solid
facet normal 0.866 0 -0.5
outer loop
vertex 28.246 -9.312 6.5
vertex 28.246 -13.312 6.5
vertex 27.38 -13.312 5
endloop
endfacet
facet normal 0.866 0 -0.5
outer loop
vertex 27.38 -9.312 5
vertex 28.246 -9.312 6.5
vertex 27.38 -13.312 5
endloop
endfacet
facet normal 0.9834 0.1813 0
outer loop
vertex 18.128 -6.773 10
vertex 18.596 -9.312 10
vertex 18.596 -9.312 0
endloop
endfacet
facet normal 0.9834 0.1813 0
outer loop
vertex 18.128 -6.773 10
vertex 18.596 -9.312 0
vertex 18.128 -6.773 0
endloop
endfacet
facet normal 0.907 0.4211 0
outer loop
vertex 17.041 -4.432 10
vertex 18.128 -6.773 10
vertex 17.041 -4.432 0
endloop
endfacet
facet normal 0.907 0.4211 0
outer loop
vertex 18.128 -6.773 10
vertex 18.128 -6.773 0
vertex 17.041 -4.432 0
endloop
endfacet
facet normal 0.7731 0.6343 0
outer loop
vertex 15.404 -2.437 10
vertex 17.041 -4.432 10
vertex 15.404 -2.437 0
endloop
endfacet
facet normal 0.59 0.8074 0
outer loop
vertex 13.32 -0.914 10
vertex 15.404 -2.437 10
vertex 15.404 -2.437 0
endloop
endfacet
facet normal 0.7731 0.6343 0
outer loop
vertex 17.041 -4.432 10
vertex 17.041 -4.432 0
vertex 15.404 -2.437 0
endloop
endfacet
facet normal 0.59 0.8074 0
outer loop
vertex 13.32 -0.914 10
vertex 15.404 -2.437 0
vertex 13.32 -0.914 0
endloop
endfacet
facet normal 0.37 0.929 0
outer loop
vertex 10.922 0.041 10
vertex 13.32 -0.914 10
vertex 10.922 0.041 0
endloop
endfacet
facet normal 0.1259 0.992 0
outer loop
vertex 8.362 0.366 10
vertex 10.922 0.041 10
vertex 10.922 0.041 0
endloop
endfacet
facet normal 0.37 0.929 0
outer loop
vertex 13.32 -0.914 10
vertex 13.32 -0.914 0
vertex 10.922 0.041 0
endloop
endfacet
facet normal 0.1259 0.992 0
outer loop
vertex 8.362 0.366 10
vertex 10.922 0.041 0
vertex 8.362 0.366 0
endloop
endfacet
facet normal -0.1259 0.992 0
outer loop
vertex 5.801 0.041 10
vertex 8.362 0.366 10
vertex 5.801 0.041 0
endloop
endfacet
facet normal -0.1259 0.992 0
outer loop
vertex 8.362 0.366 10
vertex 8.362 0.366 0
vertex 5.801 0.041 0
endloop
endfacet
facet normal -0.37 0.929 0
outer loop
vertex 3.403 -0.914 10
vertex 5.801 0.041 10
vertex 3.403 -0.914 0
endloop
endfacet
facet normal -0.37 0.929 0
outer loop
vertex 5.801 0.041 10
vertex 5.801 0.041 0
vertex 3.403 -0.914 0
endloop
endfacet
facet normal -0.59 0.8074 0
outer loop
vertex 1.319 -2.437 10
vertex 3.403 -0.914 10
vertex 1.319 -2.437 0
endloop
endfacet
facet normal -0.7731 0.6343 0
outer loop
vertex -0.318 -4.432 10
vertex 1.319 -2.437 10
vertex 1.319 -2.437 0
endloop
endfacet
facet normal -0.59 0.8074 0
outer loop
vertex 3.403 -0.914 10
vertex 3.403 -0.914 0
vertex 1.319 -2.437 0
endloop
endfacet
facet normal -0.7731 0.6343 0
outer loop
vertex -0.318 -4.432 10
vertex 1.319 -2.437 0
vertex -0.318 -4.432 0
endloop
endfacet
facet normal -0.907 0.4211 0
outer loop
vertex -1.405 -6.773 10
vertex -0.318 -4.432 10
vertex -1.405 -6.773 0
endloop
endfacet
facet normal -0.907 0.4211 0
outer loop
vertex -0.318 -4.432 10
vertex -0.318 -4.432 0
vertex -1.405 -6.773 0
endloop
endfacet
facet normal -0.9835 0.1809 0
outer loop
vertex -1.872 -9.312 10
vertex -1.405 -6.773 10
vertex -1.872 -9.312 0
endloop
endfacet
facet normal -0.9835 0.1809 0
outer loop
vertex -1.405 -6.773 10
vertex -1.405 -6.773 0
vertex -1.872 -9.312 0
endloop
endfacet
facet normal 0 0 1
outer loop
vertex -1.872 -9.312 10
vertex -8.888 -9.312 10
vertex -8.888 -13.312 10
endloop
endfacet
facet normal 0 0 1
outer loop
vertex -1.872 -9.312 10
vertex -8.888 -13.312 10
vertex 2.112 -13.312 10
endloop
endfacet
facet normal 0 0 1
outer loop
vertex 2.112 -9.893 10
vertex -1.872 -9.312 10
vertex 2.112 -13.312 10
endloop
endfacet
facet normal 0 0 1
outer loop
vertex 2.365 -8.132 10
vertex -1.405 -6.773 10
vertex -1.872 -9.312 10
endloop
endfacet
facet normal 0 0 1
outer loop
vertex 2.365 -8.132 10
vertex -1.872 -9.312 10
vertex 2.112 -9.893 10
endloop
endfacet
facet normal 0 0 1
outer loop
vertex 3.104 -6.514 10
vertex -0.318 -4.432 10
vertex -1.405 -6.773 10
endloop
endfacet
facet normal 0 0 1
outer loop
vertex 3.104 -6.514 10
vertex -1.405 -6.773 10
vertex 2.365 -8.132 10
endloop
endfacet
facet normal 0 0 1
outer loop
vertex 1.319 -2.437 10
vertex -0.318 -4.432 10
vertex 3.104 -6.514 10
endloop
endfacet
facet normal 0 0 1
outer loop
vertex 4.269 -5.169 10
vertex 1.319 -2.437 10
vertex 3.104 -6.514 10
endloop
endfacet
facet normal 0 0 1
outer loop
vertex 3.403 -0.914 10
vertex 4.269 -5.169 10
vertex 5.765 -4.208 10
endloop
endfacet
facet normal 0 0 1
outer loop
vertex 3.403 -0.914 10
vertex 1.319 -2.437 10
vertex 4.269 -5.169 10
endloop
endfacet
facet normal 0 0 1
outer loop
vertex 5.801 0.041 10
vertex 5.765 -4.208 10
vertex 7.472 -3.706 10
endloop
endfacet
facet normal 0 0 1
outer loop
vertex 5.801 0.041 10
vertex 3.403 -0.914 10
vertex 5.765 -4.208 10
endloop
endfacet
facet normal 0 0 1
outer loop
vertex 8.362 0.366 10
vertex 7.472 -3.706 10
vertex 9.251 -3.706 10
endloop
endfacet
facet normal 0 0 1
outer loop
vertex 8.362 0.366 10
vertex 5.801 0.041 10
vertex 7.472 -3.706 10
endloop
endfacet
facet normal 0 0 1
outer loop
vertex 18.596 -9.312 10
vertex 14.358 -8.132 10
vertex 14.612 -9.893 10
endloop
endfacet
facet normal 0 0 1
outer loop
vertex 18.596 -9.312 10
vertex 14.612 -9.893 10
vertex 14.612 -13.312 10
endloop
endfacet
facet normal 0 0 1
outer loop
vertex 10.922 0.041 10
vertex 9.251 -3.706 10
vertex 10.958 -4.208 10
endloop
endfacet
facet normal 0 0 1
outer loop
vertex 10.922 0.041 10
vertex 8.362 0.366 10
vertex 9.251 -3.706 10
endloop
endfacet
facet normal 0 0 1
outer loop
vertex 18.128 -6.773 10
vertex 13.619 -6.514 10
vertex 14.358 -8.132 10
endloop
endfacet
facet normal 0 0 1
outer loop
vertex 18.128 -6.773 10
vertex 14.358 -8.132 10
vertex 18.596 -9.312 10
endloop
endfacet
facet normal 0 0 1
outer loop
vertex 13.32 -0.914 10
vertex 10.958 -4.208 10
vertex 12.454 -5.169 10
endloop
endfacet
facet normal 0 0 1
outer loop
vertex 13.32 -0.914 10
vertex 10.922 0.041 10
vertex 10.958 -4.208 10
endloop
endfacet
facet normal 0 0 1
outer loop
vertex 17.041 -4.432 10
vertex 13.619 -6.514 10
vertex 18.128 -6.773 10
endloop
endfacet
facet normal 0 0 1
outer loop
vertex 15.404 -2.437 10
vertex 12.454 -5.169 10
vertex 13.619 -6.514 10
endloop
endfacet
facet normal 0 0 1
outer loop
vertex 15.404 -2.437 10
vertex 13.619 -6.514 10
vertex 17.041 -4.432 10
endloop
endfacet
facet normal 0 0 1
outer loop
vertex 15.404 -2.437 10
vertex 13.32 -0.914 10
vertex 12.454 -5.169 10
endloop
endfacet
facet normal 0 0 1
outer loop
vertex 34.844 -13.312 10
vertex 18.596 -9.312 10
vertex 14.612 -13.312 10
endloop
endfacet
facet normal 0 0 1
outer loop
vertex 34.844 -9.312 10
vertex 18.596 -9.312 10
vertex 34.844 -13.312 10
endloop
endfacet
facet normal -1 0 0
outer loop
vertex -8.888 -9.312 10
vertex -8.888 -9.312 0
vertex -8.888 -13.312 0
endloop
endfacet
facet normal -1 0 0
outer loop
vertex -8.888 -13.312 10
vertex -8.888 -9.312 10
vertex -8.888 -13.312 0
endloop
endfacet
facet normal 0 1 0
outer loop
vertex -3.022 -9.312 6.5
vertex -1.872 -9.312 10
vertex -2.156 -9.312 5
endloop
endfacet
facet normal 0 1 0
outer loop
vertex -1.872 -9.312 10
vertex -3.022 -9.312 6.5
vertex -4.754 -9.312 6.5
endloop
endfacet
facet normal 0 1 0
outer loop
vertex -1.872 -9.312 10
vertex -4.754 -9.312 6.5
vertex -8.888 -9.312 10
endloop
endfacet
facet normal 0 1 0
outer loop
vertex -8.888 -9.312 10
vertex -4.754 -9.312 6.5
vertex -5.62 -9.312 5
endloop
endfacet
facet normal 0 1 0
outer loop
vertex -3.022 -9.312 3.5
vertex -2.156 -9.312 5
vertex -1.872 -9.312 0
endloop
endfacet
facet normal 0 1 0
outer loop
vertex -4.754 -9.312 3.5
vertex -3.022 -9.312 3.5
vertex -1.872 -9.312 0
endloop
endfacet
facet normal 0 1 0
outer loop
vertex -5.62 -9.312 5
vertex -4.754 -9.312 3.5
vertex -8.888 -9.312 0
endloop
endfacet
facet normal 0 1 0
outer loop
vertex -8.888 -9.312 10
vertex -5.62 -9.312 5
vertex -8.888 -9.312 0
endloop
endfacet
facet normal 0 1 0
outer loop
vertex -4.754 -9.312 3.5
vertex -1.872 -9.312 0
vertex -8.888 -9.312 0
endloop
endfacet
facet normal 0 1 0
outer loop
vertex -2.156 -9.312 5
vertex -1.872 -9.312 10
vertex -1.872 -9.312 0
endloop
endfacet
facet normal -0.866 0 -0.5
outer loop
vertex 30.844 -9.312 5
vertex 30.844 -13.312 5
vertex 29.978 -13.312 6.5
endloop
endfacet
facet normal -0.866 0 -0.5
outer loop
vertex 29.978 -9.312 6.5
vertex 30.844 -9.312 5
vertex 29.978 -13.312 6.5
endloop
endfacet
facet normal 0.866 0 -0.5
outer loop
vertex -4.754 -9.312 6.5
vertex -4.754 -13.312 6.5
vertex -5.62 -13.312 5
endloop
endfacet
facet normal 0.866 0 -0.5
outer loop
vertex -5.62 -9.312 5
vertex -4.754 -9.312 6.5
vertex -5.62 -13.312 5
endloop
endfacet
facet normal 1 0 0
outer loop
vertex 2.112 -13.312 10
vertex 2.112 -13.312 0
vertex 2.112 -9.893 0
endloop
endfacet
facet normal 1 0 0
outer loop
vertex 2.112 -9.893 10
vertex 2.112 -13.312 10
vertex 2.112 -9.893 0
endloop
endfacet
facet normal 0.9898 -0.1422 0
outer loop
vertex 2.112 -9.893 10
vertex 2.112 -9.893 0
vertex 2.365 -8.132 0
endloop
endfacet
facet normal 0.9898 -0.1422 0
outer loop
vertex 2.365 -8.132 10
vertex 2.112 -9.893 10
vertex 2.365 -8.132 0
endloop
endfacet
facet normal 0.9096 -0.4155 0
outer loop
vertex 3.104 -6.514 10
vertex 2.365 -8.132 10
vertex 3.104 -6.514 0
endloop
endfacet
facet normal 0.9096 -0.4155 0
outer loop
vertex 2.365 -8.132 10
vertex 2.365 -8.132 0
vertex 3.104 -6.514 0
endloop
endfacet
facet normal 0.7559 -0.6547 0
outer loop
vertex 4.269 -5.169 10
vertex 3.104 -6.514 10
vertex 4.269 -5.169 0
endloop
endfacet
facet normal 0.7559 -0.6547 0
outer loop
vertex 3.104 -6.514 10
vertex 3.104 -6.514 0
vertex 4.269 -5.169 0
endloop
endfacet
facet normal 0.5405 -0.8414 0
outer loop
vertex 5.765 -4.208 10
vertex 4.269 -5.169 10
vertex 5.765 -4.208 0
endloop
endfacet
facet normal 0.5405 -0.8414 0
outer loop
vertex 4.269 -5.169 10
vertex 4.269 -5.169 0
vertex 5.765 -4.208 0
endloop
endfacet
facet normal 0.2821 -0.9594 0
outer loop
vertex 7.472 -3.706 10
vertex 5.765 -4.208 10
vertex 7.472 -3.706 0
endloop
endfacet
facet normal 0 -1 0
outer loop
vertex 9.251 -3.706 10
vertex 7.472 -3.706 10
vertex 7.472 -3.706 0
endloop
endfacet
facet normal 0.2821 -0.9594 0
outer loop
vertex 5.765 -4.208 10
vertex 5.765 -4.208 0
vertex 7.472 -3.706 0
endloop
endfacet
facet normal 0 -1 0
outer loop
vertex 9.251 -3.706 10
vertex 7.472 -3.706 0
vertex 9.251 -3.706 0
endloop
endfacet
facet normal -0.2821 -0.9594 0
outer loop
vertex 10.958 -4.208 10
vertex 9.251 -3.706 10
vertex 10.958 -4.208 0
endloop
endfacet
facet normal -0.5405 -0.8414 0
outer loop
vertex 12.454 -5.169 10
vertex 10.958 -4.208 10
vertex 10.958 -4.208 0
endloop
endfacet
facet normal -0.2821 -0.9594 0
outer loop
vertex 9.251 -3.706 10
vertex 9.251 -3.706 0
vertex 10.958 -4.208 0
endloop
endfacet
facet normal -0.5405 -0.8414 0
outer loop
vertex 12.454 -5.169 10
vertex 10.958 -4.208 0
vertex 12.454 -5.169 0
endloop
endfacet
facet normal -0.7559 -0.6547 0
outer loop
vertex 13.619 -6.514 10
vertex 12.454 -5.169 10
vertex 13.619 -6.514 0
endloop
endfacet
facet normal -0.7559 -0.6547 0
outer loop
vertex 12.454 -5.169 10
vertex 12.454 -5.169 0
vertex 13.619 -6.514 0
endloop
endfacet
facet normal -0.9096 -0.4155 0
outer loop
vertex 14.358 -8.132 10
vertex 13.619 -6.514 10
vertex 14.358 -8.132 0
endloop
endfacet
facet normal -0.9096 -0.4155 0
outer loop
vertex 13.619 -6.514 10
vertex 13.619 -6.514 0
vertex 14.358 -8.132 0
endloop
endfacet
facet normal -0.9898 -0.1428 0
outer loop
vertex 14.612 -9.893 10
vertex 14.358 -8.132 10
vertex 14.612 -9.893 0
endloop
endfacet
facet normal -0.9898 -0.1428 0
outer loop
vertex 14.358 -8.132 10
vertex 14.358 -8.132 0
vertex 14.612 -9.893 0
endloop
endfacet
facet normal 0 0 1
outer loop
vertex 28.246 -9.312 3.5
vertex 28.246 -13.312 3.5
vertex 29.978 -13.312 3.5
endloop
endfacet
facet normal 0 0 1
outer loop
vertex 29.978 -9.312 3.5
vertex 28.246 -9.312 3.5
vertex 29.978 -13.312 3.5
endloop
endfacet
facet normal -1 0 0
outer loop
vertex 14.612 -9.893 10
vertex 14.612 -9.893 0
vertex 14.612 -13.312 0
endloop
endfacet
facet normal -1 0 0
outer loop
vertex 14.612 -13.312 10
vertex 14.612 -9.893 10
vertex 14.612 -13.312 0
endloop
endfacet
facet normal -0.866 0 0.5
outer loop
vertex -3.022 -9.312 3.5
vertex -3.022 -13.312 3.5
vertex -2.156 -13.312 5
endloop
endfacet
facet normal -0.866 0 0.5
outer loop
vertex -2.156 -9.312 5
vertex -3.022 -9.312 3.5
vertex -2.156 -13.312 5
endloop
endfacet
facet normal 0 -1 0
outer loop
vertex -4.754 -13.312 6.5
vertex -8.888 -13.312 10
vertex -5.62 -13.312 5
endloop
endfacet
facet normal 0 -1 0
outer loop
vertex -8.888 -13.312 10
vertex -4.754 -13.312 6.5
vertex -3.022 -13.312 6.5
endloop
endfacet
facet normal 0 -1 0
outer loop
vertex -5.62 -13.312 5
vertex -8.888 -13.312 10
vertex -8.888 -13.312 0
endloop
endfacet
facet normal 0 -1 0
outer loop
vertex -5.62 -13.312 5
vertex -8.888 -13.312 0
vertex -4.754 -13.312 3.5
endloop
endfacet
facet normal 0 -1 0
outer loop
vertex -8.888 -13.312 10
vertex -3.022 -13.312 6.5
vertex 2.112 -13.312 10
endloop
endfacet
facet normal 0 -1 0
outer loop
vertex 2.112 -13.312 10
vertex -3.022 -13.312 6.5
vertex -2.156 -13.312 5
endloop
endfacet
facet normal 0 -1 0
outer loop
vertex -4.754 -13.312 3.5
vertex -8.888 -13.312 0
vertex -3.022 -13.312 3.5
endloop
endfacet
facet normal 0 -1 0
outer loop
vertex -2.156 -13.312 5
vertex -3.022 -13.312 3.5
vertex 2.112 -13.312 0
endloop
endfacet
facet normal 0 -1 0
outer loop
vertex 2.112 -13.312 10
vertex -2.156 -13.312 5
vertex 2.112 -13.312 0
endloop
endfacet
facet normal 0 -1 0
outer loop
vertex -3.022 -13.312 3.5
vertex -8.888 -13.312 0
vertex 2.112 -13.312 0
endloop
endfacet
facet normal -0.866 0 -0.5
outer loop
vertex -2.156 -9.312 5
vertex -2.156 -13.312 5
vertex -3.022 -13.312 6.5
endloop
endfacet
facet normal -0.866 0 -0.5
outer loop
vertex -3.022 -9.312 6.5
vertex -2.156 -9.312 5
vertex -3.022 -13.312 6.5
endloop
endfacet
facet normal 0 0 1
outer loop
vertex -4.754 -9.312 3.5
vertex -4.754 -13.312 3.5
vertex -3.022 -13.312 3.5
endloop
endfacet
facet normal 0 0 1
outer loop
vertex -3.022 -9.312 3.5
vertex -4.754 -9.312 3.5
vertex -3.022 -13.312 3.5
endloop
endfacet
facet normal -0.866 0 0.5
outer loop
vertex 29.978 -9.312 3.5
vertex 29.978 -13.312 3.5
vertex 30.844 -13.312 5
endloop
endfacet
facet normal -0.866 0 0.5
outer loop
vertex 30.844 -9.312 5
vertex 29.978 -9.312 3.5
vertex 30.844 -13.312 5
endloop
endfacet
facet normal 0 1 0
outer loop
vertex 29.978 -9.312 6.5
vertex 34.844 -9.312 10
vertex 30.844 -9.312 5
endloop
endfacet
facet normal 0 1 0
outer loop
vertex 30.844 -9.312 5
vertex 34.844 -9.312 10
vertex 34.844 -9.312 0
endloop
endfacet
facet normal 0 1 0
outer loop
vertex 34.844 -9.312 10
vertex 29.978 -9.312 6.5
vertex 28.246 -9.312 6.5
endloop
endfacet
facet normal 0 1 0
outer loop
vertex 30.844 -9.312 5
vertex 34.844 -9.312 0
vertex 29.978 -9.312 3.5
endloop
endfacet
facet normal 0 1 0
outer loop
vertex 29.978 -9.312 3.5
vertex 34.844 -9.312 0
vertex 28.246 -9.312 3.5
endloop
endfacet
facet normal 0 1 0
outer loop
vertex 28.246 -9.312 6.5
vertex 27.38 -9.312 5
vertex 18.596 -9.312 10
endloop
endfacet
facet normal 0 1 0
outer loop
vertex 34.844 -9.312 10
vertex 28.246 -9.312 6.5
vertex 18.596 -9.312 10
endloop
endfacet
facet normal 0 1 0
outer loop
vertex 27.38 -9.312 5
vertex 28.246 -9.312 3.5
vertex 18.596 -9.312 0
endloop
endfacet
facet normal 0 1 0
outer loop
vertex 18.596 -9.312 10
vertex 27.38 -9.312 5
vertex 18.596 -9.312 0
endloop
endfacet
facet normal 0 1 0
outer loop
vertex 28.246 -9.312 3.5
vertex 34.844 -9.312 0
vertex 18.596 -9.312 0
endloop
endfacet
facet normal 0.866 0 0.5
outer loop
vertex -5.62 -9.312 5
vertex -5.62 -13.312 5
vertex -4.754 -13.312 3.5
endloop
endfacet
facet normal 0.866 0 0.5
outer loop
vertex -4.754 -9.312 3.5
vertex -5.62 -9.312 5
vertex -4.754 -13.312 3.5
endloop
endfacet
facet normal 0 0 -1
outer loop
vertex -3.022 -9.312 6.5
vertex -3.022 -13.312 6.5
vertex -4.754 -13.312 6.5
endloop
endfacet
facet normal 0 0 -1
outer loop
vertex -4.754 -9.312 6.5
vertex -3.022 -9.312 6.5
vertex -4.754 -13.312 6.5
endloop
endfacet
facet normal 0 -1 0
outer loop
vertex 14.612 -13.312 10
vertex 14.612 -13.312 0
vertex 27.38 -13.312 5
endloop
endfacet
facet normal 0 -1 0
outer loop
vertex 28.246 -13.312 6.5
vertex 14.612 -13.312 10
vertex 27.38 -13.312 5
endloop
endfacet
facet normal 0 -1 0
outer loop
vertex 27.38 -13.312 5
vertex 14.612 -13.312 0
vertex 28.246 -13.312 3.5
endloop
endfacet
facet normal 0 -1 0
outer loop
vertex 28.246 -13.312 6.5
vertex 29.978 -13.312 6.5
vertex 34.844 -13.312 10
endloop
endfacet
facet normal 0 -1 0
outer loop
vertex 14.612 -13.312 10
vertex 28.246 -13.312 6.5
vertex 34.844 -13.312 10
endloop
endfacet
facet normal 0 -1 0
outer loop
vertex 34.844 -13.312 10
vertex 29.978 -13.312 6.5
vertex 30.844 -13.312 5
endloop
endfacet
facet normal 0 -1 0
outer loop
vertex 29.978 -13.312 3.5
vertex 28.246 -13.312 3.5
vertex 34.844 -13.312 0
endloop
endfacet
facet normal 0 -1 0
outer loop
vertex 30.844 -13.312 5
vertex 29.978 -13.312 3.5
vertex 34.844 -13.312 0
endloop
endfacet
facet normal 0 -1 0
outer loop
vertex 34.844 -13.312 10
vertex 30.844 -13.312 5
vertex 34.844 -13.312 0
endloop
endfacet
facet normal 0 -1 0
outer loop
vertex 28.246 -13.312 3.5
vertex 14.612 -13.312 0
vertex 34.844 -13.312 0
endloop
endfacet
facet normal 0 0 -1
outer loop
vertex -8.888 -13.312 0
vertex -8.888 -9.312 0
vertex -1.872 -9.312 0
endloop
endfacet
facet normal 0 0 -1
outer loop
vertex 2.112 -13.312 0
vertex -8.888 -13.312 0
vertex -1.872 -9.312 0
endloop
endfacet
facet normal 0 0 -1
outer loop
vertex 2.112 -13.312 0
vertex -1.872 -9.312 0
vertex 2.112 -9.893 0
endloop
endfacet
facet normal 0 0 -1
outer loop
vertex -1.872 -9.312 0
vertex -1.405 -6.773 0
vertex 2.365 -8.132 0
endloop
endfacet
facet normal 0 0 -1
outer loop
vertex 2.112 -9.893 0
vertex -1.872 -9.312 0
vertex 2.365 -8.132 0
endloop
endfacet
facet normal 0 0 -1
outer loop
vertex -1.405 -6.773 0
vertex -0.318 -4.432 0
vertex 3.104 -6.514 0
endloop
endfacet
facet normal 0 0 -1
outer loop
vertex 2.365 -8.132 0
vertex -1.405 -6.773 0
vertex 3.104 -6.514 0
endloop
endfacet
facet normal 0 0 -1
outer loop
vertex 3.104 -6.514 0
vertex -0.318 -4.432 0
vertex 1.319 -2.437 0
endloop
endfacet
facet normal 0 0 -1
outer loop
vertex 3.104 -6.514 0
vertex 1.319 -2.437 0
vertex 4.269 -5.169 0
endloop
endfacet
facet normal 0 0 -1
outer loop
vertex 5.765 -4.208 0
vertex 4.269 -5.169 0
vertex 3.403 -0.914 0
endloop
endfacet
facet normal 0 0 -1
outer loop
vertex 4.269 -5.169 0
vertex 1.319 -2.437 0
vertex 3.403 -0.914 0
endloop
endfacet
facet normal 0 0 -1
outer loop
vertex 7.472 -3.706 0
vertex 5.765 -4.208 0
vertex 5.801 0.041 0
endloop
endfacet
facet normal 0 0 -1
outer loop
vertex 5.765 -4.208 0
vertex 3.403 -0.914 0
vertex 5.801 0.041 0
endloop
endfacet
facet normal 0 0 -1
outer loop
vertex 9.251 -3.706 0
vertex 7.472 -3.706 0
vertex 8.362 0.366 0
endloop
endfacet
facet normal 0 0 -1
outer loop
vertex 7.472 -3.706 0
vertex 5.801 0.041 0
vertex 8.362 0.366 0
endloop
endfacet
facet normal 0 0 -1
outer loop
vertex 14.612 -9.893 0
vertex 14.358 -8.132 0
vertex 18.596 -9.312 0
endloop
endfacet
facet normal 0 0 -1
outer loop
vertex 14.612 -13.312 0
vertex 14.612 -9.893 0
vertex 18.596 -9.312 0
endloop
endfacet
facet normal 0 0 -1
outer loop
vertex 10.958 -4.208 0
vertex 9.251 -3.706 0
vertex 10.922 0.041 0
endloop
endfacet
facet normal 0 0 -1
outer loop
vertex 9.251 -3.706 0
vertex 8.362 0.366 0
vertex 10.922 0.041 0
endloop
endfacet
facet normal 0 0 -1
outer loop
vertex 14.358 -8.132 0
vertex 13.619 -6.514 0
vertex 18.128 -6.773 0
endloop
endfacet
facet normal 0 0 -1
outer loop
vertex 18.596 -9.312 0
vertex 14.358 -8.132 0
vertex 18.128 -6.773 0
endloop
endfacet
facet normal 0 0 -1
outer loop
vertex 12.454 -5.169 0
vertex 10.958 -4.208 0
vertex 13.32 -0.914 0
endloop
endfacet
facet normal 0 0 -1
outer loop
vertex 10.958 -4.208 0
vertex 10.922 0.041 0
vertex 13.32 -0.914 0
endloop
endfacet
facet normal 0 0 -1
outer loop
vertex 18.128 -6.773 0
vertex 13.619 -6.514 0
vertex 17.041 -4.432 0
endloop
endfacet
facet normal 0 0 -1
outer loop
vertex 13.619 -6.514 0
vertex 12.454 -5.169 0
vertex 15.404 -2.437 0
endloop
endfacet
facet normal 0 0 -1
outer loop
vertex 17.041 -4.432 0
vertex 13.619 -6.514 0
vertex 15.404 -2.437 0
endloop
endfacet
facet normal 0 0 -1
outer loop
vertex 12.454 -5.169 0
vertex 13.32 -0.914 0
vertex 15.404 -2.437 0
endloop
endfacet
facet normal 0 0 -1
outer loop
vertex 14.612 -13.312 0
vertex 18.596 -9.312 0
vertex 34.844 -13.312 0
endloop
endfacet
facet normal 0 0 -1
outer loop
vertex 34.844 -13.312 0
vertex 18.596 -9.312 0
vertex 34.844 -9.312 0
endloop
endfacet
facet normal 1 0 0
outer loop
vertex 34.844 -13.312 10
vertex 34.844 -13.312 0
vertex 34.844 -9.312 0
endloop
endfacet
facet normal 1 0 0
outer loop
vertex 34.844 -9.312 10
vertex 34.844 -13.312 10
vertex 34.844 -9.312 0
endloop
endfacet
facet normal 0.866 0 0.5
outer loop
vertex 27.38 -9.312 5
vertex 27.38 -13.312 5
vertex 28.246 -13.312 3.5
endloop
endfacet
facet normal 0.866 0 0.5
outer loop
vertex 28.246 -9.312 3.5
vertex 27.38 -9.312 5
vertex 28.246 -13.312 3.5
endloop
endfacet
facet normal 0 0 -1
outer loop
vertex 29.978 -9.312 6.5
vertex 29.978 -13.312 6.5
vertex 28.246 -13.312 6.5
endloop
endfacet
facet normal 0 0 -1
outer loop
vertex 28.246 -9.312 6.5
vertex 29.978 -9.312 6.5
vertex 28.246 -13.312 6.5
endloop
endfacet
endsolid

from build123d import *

# Parameters (mm, degrees)
F1_DEPTH = 10
F3_DEPTH = 13.6785106988
F4_DEPTH = 3.268


with BuildPart() as f1:
    # F0 (on Top) → F1 (new body)
    with BuildSketch(Plane.XY):
        with BuildLine():
            Line((14.6115271971, -9.8928403326), (14.6115271971, -13.3118403326))
            Line((14.6115271971, -13.3118403326), (38.1115271971, -13.3118403326))
            Line((38.1115271971, -13.3118403326), (38.1115271971, -9.3118403326))
            Line((38.1115271971, -9.3118403326), (18.5955271971, -9.3118403326))
            ThreePointArc((18.5955271971, -9.3118403326), (8.3615271971, 0.3656703662), (-1.8724728029, -9.3118403326))
            Line((-1.8724728029, -9.3118403326), (-8.8884728029, -9.3118403326))
            Line((-8.8884728029, -9.3118403326), (-8.8884728029, -13.3118403326))
            Line((-8.8884728029, -13.3118403326), (2.1115271971, -13.3118403326))
            Line((2.1115271971, -13.3118403326), (2.1115271971, -9.8928403326))
            ThreePointArc((2.1115271971, -9.8928403326), (8.3615271971, -3.6428403326), (14.6115271971, -9.8928403326))
        make_face()
    extrude(amount=F1_DEPTH)

    # F2 (on face) → F3 (cut, through all)
    with BuildSketch(Plane.XZ.offset(13.3118403326)):
        Polygon((-2.1564728029, 5), (-3.0224728029, 6.4999559994), (-4.7544728029, 6.4999559994), (-5.6204728029, 5), (-4.7544728029, 3.5000440006), (-3.0224728029, 3.5000440006), align=None)
        Polygon((29.9775271971, 6.4999559994), (28.2455271971, 6.4999559994), (27.3795271971, 5), (28.2455271971, 3.5000440006), (29.9775271971, 3.5000440006), (30.8435271971, 5), align=None)
    extrude(amount=-F3_DEPTH, mode=Mode.SUBTRACT)

    # F4 (cut): a face of the model
    f4_faces = [f1.faces().sort_by_distance(p)[0] for p in [
        (38.1115271971, -11.3118403326, 5),
    ]]
    extrude(f4_faces, amount=-F4_DEPTH, mode=Mode.SUBTRACT)


solid = f1.part
